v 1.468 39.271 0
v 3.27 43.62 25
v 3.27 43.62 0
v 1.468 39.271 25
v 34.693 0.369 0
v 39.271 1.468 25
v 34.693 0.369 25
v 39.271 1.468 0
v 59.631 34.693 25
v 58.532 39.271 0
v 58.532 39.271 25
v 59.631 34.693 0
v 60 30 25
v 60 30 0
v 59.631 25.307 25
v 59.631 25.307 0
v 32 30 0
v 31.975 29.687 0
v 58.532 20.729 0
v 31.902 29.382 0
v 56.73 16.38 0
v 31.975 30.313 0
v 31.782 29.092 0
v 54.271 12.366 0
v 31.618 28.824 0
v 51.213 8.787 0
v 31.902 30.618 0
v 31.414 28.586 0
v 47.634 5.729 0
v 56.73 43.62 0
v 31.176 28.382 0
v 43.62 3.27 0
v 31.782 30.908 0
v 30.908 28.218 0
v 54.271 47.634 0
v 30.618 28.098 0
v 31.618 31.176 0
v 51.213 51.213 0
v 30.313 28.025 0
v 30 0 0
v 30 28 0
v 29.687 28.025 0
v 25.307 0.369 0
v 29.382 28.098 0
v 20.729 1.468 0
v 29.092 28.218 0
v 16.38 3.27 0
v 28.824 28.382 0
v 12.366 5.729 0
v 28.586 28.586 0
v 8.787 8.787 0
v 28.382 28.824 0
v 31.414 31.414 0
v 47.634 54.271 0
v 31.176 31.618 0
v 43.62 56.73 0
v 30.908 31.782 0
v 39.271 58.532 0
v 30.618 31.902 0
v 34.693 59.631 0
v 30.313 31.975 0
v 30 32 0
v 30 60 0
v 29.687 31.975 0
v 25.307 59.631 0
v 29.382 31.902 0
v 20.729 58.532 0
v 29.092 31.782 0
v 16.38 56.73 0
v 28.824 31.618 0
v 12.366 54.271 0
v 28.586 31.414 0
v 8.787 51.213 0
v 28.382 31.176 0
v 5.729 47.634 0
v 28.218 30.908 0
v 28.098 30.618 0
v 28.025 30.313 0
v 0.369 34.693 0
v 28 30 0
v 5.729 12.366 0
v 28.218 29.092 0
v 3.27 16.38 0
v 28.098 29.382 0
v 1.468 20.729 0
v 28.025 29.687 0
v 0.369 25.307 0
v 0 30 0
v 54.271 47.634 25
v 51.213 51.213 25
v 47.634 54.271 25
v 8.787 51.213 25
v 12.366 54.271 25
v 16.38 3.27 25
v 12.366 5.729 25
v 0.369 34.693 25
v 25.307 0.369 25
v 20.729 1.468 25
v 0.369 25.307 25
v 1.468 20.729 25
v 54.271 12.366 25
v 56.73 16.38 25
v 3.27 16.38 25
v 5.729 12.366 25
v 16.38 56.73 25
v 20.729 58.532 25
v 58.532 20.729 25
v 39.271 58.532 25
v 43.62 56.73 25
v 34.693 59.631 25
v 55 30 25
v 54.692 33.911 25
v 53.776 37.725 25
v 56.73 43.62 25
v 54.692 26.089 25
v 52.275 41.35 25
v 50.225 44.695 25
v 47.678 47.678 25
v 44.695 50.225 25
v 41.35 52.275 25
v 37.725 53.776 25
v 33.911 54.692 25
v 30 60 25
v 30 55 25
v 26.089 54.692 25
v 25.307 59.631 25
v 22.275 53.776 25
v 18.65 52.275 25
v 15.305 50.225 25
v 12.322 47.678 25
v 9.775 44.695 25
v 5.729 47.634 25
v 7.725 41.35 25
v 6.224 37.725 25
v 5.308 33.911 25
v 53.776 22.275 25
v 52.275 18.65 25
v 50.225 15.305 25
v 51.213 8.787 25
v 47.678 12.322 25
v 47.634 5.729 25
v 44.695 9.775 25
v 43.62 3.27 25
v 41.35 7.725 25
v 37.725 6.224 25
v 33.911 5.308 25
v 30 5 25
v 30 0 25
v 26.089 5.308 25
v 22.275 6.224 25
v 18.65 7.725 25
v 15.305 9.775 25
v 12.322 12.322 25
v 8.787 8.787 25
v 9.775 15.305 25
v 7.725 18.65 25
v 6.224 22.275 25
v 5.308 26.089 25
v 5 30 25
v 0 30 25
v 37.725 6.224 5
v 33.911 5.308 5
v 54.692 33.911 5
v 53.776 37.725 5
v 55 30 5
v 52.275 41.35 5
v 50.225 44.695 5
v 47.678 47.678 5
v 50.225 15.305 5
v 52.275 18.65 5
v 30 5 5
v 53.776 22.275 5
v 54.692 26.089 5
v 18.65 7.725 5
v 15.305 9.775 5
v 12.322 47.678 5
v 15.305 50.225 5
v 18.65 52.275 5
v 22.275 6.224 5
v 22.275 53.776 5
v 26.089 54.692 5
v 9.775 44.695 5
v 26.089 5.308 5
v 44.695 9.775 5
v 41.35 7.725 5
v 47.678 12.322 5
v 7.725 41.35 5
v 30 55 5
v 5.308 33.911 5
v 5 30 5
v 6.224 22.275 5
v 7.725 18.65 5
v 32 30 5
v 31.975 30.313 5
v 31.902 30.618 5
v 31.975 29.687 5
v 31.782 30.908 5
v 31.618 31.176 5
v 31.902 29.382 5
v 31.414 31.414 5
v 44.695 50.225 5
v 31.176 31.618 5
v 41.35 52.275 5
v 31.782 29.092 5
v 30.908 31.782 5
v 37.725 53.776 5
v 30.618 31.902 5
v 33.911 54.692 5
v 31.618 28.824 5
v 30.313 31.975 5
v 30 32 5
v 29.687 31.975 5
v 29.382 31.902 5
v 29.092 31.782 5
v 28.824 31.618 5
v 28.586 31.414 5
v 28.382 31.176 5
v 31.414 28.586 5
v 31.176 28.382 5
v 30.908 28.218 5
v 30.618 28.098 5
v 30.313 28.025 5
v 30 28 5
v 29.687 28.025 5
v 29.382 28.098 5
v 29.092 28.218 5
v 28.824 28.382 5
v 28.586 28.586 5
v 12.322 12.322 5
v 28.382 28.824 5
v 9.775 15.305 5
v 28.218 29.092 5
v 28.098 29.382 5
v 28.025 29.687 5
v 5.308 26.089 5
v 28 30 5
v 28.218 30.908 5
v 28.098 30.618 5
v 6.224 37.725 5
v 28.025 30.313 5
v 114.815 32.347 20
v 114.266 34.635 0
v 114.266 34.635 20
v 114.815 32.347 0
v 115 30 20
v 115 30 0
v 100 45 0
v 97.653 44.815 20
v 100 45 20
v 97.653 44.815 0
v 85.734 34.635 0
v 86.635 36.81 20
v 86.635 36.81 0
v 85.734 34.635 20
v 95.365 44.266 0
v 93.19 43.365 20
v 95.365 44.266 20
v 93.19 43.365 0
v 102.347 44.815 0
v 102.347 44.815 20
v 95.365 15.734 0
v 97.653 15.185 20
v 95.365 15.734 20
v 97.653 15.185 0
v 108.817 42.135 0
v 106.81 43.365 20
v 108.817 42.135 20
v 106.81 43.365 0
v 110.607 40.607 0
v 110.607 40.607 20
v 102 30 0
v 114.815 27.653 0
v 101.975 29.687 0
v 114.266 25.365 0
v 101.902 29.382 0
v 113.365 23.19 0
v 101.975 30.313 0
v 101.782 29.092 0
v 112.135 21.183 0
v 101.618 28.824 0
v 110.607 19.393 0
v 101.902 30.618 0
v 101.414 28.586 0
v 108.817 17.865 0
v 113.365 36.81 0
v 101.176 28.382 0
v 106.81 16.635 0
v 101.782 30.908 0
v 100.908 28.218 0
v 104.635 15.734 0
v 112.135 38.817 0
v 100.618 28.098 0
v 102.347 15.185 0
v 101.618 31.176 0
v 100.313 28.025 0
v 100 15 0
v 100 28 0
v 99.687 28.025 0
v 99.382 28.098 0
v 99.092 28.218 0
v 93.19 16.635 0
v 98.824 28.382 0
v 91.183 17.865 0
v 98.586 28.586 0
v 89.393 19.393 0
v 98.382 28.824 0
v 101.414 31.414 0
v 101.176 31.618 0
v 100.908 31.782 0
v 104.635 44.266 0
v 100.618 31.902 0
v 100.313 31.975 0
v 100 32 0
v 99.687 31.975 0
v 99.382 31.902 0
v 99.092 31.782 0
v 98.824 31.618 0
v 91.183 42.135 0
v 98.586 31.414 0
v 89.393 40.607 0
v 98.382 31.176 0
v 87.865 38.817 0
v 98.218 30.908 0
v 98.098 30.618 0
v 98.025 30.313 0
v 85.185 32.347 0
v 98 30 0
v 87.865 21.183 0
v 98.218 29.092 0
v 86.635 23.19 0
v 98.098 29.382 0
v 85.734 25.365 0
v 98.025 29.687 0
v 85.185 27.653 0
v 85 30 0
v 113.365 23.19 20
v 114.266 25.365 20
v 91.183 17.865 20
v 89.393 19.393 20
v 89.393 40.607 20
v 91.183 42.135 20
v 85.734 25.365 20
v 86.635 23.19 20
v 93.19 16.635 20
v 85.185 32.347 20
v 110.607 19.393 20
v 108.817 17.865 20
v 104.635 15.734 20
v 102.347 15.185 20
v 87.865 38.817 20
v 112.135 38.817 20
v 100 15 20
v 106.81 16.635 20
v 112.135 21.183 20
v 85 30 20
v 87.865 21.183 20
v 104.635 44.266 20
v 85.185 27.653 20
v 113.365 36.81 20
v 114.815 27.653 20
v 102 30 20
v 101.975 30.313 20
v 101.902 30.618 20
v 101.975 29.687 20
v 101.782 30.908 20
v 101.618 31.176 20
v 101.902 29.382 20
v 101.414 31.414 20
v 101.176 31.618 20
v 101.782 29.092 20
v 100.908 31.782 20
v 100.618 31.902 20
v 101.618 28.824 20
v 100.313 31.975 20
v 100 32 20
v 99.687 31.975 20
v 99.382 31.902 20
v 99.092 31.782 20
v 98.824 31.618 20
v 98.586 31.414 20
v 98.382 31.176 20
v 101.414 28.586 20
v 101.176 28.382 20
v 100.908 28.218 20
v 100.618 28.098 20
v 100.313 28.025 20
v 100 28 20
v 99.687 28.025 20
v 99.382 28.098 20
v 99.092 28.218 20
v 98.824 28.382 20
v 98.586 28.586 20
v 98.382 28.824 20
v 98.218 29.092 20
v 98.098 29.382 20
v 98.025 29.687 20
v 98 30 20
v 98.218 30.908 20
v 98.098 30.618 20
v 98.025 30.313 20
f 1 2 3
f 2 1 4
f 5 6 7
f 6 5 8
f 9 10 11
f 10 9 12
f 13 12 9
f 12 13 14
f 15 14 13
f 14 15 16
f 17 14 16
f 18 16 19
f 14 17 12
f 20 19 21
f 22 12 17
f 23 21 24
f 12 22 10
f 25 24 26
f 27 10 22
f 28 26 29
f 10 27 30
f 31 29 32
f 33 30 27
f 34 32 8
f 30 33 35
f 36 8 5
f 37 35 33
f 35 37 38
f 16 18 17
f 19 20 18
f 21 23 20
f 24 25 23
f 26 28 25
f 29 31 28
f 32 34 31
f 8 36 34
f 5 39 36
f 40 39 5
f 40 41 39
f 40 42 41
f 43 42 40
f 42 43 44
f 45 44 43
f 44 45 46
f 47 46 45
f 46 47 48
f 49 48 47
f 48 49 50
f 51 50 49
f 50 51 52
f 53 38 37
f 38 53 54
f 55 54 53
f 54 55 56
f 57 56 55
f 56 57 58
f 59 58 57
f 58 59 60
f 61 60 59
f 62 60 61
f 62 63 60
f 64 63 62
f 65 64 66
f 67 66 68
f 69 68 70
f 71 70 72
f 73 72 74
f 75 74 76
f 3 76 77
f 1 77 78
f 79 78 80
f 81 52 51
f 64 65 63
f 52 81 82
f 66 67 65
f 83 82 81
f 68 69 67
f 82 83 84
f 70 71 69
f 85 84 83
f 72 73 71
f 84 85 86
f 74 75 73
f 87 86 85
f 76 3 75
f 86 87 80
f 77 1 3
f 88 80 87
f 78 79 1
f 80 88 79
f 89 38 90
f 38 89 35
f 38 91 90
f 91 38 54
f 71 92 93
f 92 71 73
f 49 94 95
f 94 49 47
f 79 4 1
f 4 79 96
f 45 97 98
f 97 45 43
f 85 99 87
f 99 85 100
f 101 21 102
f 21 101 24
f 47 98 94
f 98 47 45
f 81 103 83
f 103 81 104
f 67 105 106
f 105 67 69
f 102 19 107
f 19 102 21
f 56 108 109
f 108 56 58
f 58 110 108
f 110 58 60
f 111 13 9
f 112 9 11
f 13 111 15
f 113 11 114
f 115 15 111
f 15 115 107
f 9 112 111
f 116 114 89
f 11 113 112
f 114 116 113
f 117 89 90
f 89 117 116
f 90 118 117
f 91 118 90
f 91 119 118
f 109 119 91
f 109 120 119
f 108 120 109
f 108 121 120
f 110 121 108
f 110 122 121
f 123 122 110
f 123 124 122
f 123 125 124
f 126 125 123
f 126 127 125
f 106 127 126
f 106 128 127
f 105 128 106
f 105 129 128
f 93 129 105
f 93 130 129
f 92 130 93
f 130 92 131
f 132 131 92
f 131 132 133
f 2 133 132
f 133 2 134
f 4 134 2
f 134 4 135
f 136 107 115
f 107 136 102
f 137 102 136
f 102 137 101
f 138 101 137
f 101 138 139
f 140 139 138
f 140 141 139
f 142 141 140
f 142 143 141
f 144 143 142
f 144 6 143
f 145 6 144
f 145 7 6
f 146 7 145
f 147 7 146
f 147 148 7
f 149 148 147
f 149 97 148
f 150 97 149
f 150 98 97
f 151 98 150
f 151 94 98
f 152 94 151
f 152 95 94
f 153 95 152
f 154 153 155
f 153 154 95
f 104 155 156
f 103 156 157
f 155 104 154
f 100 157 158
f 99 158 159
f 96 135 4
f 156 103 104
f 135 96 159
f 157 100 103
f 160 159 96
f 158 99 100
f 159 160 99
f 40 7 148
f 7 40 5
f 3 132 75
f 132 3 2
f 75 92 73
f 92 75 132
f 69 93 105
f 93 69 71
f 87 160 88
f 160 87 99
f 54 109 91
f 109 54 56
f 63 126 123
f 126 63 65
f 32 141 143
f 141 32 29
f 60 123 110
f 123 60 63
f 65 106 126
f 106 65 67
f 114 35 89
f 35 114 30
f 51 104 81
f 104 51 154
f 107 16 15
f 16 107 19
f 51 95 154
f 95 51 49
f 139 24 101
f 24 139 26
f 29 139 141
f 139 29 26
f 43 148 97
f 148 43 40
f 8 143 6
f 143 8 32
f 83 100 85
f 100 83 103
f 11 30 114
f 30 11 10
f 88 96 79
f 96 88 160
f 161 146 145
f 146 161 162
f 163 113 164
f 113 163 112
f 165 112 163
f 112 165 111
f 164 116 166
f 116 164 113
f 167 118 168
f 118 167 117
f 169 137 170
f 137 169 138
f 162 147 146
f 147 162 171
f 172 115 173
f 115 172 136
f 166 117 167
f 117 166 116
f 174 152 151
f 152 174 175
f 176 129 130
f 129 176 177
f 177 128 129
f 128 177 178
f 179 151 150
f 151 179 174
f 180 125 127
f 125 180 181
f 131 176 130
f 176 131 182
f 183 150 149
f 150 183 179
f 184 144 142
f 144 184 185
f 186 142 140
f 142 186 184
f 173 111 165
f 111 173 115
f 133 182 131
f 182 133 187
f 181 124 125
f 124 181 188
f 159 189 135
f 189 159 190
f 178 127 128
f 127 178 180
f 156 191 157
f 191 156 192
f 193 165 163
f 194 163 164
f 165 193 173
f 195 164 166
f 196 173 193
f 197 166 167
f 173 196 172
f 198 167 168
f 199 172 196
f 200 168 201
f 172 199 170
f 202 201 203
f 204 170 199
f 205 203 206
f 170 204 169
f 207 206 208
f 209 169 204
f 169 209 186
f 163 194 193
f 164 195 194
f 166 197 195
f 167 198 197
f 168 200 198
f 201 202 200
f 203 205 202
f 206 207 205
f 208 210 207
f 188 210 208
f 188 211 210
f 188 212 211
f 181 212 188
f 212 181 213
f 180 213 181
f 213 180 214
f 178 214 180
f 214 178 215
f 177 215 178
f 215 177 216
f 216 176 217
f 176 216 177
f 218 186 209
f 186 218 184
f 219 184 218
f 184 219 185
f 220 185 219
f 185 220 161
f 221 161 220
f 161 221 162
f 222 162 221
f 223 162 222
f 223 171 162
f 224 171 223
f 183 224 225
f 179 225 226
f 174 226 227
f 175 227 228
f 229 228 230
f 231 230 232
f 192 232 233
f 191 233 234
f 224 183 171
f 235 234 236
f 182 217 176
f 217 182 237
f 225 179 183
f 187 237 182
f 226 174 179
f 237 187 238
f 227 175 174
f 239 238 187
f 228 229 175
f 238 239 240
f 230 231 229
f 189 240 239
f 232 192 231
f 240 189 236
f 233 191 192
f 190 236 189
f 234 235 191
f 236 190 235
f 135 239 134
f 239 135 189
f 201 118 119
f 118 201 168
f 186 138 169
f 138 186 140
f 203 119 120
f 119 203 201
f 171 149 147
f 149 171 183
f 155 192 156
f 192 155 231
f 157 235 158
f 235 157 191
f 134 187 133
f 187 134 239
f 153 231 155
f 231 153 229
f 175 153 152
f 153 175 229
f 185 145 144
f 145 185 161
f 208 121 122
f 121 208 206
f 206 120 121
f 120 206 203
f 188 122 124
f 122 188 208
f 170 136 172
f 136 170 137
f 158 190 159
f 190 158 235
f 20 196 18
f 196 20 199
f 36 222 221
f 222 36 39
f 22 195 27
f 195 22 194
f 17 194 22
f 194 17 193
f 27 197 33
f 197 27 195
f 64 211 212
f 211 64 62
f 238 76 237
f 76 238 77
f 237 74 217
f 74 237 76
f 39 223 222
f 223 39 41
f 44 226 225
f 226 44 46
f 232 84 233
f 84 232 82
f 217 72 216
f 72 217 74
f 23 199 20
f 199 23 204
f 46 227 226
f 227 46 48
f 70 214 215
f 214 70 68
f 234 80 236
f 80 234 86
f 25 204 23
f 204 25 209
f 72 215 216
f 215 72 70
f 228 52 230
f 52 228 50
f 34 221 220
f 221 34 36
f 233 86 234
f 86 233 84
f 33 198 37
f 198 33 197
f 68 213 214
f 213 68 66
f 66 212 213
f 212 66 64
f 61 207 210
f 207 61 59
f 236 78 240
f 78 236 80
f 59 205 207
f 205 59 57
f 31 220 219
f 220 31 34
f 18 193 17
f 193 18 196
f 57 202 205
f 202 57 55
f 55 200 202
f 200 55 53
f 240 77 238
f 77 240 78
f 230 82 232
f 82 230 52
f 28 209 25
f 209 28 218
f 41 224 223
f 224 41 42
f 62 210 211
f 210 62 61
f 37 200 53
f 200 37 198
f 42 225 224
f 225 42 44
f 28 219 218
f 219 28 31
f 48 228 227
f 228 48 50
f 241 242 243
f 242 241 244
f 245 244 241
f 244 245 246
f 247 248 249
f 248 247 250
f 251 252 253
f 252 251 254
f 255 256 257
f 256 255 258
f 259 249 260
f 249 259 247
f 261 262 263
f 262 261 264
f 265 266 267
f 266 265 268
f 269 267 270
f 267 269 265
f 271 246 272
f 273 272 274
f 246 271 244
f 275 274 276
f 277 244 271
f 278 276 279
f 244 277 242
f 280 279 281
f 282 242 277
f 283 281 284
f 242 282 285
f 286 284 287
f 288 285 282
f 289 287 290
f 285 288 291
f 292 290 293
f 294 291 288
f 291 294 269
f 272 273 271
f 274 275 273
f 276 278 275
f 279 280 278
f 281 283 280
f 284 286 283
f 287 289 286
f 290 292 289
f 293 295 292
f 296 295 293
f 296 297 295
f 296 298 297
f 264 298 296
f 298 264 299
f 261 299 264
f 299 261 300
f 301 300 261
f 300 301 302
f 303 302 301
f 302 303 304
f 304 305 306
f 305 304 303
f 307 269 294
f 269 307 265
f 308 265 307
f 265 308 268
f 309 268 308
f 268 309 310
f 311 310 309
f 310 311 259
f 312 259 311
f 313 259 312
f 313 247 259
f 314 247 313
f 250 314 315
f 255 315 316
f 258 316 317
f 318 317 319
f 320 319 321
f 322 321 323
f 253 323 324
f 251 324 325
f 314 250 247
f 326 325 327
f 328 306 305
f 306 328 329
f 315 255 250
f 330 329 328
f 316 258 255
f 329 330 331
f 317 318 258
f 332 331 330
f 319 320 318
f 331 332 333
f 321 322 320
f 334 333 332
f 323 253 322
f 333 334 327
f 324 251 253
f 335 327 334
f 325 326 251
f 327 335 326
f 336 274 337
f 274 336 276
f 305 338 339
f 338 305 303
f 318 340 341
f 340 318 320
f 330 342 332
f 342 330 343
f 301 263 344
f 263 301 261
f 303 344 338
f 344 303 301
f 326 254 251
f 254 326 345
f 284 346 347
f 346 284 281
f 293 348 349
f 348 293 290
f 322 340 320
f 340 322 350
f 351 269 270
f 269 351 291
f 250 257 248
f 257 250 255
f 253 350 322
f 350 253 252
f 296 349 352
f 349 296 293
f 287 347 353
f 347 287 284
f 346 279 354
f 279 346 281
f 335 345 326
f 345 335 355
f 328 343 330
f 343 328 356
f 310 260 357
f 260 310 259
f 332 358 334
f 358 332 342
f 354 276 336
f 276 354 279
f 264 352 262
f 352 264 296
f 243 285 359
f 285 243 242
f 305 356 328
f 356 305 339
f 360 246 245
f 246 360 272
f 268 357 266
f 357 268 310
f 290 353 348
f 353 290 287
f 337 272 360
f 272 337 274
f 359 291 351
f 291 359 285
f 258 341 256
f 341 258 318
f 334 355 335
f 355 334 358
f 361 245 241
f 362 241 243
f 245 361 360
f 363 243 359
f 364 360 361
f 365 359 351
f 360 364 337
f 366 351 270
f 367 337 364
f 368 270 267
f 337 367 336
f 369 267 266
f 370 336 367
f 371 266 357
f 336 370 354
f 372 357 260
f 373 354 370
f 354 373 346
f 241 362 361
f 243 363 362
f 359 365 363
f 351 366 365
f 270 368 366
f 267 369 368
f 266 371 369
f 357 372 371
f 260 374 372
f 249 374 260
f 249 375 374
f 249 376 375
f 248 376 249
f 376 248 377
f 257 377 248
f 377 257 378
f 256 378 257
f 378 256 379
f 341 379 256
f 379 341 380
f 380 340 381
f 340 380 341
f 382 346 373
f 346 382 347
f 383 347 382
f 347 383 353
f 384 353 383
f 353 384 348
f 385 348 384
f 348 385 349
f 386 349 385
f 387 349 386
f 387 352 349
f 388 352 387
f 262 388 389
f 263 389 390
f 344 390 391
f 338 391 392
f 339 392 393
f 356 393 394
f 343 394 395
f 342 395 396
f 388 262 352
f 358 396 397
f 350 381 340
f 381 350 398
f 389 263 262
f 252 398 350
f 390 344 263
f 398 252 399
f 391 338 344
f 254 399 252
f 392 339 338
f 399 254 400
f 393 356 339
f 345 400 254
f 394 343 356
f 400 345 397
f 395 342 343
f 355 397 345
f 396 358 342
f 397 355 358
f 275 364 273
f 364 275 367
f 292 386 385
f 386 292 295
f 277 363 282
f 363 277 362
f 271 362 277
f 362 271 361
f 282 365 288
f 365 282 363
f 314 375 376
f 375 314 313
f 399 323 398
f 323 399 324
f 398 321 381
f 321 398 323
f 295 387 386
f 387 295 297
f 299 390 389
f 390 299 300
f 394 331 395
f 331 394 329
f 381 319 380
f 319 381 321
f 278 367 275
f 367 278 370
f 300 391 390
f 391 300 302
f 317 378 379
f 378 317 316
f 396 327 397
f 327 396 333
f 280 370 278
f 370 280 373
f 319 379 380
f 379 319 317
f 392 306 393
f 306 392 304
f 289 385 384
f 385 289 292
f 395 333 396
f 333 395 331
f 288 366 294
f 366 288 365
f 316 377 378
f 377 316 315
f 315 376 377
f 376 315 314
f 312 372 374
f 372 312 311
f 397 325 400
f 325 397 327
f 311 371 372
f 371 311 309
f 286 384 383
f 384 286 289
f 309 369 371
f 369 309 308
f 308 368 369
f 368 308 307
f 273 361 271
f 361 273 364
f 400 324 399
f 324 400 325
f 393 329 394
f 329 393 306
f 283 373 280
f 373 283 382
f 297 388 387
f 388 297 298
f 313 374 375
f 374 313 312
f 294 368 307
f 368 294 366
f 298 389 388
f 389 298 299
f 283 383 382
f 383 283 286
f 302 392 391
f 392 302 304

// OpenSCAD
$fn = 40; // 360 is smooth

module tire(radio, thickness, width) {
  translate([radio / 2, radio / 2, thickness * 2])
  rotate_extrude()
    translate([radio / 2 + thickness, 0, 0])
      translate([-thickness * 2, -thickness * 2, 0]) 
        square([thickness, width]);  
}
//color("lightgray") tire(60, 5, 20);

//// prototipo con module tire
//difference() {
//  translate([35 - 5, 35 - 5, 0]) color("pink")    cylinder(h=25, r=35);
//  translate([0, 0, 5])           color("SkyBlue") tire(60, 10, 20);
//  translate([35 - 5, 35 - 5, 0]) color("SkyBlue") cylinder(h=25, r=2);
//}

// pieza base contenedora
difference() {
  // base y paredes del molde
  translate([30, 30, 0]) color("pink")    cylinder(h=25, r=30);
  // espacio para la cubierta
  translate([30, 30, 5]) color("SkyBlue") cylinder(h=25, r=25);
  // tornillo central
  translate([30, 30, 0]) color("SkyBlue") cylinder(h=25, r=2);
}

// pieza móvil del centro
translate([70, 0, -5]) // esto saca la pieza de adentro de la otra
difference() {
  // pieza central para determinar el ancho de la rueda
  translate([30, 30, 5]) color("pink")    cylinder(h=20, r=15);
  // tornillo central
  translate([30, 30, 5]) color("SkyBlue") cylinder(h=20, r=2);
}
